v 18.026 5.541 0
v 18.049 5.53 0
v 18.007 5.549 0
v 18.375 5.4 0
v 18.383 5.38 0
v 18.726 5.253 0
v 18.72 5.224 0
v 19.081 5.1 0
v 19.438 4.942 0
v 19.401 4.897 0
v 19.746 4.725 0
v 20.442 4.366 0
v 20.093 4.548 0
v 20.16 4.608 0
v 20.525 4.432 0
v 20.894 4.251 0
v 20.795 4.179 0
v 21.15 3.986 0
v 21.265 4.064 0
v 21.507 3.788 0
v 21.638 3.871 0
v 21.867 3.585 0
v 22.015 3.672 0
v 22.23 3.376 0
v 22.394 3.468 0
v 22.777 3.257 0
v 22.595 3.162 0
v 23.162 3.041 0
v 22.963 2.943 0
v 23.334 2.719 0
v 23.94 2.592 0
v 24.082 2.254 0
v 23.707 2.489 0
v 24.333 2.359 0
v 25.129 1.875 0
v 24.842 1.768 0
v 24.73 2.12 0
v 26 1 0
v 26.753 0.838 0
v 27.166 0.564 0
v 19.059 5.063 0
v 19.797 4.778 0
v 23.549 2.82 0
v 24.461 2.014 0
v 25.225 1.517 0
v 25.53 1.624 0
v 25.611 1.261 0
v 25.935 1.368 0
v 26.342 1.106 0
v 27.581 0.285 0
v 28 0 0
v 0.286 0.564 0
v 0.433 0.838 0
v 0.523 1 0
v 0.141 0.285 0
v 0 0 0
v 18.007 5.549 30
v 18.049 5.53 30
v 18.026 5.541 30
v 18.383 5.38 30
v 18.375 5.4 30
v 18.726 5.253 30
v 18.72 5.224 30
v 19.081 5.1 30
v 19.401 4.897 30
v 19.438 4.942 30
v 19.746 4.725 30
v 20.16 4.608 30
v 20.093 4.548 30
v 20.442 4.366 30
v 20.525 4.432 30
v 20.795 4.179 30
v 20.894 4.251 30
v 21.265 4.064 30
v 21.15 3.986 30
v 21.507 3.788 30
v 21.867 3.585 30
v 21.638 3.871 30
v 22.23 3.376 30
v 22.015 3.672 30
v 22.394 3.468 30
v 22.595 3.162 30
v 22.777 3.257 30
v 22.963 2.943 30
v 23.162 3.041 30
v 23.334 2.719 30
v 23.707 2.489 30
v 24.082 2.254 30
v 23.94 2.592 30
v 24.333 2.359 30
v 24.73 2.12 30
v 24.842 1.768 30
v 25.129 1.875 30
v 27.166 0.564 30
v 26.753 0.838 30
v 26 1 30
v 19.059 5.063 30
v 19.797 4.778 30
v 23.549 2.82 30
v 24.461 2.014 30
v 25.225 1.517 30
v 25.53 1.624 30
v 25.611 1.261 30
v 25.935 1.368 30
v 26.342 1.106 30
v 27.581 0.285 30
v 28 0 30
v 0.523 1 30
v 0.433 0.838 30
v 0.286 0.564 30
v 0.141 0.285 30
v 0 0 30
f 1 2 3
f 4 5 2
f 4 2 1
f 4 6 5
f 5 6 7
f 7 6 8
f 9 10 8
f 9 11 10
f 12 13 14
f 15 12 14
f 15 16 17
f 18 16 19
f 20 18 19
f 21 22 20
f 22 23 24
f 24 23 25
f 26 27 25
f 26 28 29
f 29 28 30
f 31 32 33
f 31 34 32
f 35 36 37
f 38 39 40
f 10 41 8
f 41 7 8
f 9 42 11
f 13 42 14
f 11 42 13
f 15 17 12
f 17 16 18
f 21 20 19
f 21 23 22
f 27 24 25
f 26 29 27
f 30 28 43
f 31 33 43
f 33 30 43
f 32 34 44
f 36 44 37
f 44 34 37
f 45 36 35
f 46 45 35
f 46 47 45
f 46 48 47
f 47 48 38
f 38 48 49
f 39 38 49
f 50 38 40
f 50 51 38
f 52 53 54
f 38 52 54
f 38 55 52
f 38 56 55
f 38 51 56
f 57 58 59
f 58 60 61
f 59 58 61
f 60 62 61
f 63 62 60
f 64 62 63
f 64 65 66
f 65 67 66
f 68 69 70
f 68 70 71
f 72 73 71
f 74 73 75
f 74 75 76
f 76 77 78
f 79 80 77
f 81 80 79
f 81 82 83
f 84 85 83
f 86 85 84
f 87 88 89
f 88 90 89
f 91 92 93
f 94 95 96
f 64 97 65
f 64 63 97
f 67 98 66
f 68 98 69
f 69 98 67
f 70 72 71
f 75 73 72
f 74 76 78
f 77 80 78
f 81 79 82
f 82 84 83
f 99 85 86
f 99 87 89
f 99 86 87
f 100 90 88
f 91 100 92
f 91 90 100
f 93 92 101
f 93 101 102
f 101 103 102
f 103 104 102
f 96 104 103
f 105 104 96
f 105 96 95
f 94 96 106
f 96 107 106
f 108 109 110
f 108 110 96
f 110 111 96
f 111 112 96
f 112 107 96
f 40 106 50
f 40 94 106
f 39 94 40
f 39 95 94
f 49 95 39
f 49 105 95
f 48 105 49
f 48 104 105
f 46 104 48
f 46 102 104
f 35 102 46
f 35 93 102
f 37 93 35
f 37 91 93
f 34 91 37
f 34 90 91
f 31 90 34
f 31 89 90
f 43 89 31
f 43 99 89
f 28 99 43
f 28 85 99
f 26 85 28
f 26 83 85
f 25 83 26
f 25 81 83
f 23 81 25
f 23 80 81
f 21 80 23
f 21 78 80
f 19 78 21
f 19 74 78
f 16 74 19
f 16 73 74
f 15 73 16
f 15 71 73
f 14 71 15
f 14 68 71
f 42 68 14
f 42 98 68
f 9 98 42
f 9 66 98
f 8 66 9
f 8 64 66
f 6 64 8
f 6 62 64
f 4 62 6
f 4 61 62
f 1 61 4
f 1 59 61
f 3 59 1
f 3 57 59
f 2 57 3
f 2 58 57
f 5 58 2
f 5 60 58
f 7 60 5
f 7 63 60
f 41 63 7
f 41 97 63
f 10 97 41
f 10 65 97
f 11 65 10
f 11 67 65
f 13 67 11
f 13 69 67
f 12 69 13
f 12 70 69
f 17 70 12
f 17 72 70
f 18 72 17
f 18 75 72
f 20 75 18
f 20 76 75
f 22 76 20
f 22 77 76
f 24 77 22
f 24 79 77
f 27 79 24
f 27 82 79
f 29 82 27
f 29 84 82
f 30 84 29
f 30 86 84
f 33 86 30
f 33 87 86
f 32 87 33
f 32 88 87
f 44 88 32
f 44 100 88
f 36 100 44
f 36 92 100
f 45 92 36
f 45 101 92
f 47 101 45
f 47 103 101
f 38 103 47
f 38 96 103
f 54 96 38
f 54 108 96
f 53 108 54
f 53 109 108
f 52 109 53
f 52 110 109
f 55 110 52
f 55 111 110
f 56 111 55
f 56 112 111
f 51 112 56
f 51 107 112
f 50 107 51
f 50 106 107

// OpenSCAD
// Définition des variables
c = 28; // Longueur de la corde
h = 12; // Hauteur maximale
thickness = 1; // Épaisseur de l'arc en mm
height = 30; // Hauteur de l'extrusion en mm

// Point de contrôle (à ajuster)
control_x = c/4;
control_y = h * 1.2;

// Fonction pour créer une courbe de Bézier quadratique
module bezier_curve(steps = 100) {
    step = 1 / steps;
    points = [
        for (t = [0 : step : 1])
        let(
            x = (1-t)^2 * 0 + 2*(1-t)*t * control_x + t^2 * c,
            y = (1-t)^2 * 0 + 2*(1-t)*t * control_y + t^2 * 0
        )
            [x, y]
        ];
    polygon(concat([[0,0]], points, [[c,0]]));
}

// Création de l'arc avec épaisseur
linear_extrude(height = height)
    difference() {
        bezier_curve();
        translate([0, thickness])
            scale([(c-2*thickness)/c, (h-thickness)/h])
                bezier_curve();
    }

// Point de contrôle (pour visualisation)
translate([control_x, control_y])
    color("red")
        circle(r = 0.5);

// Annotations
color("black") {
    translate([c/2, -2])
        text(str("Corde: ", c, " mm"), size = 2, halign = "center");
    translate([-3, h/2])
        rotate([0,0,90])
            text(str("Hauteur: ", h, " mm"), size = 2, halign = "center");
}
